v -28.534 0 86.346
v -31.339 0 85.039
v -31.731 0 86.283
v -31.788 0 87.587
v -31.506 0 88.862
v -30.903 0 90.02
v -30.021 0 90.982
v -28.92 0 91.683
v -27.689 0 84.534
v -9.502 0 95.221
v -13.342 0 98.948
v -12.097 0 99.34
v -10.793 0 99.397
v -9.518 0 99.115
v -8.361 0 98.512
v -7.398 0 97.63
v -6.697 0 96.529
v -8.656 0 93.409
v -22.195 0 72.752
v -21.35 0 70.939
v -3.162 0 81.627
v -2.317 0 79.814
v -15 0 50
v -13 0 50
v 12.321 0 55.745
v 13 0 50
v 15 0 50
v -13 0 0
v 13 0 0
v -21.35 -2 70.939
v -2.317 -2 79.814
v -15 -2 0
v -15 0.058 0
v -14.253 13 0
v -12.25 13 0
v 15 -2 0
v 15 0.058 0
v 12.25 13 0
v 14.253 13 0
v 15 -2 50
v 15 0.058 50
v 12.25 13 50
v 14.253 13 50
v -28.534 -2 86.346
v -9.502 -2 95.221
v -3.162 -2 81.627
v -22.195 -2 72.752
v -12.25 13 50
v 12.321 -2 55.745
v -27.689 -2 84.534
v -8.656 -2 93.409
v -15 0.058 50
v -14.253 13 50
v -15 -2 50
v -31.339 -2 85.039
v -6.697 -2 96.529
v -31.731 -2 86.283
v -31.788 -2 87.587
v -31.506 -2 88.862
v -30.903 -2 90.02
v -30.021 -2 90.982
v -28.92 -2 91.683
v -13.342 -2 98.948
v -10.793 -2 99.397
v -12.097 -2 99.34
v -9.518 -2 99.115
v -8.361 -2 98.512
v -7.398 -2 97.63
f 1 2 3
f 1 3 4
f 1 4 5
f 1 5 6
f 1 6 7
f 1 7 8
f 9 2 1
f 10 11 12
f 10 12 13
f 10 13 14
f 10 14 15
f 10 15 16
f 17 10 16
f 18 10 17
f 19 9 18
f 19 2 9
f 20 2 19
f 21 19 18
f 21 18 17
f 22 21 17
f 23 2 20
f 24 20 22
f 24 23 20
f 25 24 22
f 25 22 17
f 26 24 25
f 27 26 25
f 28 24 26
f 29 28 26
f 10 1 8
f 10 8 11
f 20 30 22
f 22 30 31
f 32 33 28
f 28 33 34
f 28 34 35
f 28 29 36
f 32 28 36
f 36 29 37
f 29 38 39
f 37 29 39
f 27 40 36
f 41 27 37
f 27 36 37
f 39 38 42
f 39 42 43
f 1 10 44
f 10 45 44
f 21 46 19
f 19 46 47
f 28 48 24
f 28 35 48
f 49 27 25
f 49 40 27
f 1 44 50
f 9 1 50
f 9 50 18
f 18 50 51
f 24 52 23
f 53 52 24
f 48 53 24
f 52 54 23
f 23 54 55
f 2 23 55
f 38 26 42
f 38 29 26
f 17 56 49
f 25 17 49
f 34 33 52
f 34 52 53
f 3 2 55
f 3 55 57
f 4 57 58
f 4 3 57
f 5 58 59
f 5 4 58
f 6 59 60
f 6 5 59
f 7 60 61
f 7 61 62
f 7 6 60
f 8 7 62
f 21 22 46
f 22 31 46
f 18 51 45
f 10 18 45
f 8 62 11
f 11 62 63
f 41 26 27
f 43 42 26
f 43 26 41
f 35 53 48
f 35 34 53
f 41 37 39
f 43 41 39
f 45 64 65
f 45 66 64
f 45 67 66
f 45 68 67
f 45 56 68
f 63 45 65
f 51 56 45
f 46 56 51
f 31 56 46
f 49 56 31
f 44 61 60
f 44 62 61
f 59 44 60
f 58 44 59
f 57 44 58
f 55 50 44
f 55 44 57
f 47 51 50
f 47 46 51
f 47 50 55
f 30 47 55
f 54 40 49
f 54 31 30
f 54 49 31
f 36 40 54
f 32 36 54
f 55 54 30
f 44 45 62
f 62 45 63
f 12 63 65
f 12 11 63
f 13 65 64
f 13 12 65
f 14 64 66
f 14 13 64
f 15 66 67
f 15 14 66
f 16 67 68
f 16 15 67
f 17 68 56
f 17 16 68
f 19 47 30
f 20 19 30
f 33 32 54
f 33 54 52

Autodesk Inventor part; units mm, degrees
ref_plane "YZ Plane" through (0, 0, 0) normal (1, 0, 0) x (0, 1, 0)
ref_plane "XZ Plane" through (0, 0, 0) normal (0, 1, 0) x (-1, 0, 0)
ref_plane "XY Plane" through (0, 0, 0) normal (0, 0, 1) x (1, 0, 0)
sketch "Sketch1" plane through (0, 0, 0) normal (0, 0, 1) x (1, 0, 0)
  line L0 (-13, 0) -> (13, 0)
  line L1 (13, 0) -> (12.25, 13)
  line L2 (12.25, 13) -> (14.2533, 13)
  line L3 (15, -2) -> (-15, -2)
  line L4 (-14.2533, 13) -> (-12.25, 13)
  line L5 (-12.25, 13) -> (-13, 0)
  line L6 (-15, -2) -> (-15, 0.0576)
  line L7 (-15, 0.0576) -> (-14.2533, 13)
  line L8 (15, -2) -> (15, 0.0576)
  line L9 (15, 0.0576) -> (14.2533, 13)
  point P0 (0, 0)
  point P1 (0, 0)
  point P2 (0, -2)
  dimension "d0" = 24.5
  dimension "d2" = 2
  dimension "d4" = 26
  dimension "d5" = 13
  dimension "d27" = 2
  dimension "d28" = 2
extrude "Extrusion1" add sketch "Sketch1" along normal blind 50
sketch "Sketch2" plane through (-15, -2, 0) normal (0, -1, 0) x (1, 0, 0)
  line L0 (0, 50) -> (30, 50) projected
  line L1 (0, 0) -> (0, 50) projected
  line L2 (15, 50) -> (-6.1309, 95.3154)
  line L3 (-18.4518, 89.5701) -> (6.19, 101.0607)
  line L4 (6.19, 101.0607) -> (27.3209, 55.7453)
  line L5 (27.3209, 55.7453) -> (2.6791, 44.2547)
  line L6 (2.6791, 44.2547) -> (-18.4518, 89.5701)
  line L7 (30, 50) -> (27.3209, 55.7453)
  point P0 (15, 0)
  dimension "d8" = 25
  dimension "d13" = 50
extrude "Extrusion2" add sketch "Sketch2" against normal up to surface (2 mm away)
sketch "Sketch3" plane through (-15, -2, 0) normal (0, -1, 0) x (1, 0, 0)
  line L0 (30, 0) -> (30, 50) projected
  line L1 (6.19, 101.0607) -> (-18.4518, 89.5701) projected
  line L2 (-18.4518, 89.5701) -> (0, 50) projected
  line L3 (-13.5341, 86.3464) -> (-12.6888, 84.5337)
  line L4 (-12.6888, 84.5337) -> (6.3436, 93.4087)
  line L5 (6.3436, 93.4087) -> (5.4984, 95.2213)
  line L6 (5.4984, 95.2213) -> (-13.5341, 86.3464)
  line L7 (-6.1309, 95.3154) -> (30, 17.8324) construction
  point P0 (30.2374, 50)
  point P1 (15, 0)
  point P2 (-4.0178, 90.7839)
  dimension "d17" = 21
  dimension "d19" = 5
  dimension "d20" = 2
extrude "Extrusion3" cut sketch "Sketch3" against normal through all
pattern_linear "Rectangular Pattern1" count 2 spacing 15 along (0.4226, 0, -0.9063) of "Extrusion3"
fillet "Fillet1" radius 5 2 edges at (-33.4518, -1, 89.5701) (-8.81, -1, 101.0607)
properties part number "tow ribbon management"
